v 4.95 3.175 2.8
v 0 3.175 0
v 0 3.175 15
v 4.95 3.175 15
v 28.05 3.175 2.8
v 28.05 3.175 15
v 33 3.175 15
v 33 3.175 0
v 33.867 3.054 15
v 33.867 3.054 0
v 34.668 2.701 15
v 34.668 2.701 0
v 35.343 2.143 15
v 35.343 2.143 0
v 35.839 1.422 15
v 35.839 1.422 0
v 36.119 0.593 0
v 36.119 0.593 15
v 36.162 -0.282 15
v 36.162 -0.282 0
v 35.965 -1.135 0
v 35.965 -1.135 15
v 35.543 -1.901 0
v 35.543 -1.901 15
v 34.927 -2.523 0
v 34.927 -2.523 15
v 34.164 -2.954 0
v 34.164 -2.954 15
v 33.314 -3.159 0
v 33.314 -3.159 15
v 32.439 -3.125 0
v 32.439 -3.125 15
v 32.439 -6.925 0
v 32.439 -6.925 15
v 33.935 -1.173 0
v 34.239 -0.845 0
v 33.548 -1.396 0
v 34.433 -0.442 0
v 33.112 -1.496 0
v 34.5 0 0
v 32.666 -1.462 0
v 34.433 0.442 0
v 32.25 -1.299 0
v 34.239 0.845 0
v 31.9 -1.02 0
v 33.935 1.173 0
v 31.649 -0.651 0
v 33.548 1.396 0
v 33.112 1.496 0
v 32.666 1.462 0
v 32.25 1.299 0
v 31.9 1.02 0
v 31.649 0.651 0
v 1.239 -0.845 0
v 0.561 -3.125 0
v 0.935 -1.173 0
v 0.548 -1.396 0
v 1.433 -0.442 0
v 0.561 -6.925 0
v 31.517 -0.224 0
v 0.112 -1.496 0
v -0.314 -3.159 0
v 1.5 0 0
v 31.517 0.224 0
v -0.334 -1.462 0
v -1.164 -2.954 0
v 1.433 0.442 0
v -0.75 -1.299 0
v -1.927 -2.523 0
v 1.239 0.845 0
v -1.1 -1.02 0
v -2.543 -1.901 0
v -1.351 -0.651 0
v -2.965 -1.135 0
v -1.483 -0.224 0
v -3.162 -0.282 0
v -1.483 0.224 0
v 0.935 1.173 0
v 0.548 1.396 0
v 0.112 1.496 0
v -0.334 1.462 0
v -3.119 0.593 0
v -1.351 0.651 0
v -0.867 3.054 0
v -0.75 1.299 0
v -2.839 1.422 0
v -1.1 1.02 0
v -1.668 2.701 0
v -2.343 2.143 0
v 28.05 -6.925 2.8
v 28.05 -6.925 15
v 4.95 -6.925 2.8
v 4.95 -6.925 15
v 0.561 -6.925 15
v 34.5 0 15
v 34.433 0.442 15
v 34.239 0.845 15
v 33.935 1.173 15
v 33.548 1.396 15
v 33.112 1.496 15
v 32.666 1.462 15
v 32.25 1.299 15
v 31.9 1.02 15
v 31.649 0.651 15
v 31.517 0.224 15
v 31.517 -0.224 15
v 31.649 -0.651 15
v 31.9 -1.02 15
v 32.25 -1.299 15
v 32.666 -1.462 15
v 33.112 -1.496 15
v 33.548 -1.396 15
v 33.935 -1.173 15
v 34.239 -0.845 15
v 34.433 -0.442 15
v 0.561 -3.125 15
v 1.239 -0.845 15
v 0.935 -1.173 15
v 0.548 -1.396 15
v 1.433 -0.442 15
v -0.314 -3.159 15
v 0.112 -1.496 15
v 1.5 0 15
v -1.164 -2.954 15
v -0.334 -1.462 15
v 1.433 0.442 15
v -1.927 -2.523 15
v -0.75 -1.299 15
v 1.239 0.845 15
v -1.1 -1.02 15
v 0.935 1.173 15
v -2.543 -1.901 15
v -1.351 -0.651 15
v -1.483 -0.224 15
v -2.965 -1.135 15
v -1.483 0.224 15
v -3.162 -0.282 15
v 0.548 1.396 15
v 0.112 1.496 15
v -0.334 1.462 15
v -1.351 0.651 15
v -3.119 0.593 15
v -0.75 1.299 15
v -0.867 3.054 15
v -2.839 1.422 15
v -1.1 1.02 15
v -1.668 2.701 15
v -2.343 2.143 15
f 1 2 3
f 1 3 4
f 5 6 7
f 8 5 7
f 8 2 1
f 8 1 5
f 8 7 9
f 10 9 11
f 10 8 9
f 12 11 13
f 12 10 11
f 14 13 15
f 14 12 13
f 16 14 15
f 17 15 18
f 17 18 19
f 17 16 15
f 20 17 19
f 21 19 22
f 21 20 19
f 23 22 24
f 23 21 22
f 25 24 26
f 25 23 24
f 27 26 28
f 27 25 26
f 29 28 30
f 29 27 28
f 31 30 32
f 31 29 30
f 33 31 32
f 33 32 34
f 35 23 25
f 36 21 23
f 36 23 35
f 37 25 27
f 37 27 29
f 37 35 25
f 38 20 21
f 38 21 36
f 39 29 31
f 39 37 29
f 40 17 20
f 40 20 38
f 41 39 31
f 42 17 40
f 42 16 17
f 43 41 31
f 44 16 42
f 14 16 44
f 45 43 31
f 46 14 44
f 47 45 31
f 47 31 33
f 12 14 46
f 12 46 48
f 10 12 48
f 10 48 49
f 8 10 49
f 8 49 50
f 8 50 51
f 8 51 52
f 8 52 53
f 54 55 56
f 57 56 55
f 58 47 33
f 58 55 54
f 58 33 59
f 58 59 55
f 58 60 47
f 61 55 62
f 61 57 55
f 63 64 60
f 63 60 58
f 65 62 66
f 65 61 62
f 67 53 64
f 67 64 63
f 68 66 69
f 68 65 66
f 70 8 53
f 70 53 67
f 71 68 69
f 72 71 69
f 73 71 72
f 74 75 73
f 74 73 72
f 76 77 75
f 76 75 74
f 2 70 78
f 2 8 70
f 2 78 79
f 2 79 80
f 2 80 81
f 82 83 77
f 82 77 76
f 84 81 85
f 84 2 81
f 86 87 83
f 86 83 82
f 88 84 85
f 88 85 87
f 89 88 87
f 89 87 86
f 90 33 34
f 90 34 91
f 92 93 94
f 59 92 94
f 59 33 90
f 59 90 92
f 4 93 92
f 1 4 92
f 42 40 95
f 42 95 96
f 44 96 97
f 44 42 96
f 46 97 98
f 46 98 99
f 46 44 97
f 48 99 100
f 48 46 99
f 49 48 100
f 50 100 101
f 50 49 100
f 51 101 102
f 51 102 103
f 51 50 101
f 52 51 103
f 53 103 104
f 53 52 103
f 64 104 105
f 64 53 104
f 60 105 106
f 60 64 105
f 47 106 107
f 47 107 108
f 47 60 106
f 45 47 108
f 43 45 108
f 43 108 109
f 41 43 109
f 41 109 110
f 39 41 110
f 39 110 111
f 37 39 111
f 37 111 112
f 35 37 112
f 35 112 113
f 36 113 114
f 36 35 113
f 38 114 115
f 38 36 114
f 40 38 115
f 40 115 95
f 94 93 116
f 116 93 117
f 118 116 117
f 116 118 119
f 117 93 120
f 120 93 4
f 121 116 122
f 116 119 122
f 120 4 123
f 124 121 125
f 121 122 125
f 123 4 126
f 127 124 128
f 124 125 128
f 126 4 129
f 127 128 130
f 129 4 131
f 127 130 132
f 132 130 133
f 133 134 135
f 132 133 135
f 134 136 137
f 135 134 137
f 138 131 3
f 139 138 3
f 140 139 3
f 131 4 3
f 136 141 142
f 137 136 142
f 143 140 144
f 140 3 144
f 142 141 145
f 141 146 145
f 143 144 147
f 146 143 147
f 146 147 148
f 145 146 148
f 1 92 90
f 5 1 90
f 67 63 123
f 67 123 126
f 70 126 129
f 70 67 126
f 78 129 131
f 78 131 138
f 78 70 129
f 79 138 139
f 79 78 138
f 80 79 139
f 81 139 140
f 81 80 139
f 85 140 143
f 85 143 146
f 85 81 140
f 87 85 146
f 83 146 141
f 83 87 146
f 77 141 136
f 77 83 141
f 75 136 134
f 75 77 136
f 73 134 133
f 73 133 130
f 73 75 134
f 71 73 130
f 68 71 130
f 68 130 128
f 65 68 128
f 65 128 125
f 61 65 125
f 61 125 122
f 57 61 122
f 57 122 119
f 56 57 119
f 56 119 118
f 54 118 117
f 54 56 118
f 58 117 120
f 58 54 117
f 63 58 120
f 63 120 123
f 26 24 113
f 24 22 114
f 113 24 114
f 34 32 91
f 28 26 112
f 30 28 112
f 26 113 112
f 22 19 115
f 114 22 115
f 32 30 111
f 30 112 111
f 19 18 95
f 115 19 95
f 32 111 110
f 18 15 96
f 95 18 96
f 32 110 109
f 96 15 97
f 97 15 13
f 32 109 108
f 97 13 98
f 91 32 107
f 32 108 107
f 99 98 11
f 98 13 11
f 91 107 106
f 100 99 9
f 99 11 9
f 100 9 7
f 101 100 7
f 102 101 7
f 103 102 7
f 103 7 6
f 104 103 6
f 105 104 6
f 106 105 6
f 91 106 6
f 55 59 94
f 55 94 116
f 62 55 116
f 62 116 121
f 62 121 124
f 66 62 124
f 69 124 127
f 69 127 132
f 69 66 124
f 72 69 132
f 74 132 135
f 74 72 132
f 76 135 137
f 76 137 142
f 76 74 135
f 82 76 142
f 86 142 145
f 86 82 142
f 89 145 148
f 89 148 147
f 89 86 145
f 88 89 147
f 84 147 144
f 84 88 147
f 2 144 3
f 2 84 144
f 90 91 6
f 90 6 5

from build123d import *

# Parameters (mm, degrees)
ESBO_O1_R                  = 1.5
RESSALTO_EXTRUS_O1_DEPTH   = 15
CORTE_EXTRUS_O1_DEPTH      = 40.769162048
CORTE_EXTRUS_O1_DEPTH_BACK = 40.769162048
ESBO_O2_W                  = 23.1
ESBO_O2_H                  = 12.2


with BuildPart() as part:
    # Esboço1 → Ressalto-extrusão1 (new body)
    with BuildSketch(Plane.XY):
        with BuildLine():
            Line((0, 3.175), (33, 3.175))
            ThreePointArc((33, 3.175), (36.162475296, -0.281735692), (32.438751392, -3.125))
            Line((32.438751392, -3.125), (32.438751392, -6.925))
            Line((32.438751392, -6.925), (0.561248608, -6.925))
            Line((0.561248608, -6.925), (0.561248608, -3.125))
            ThreePointArc((0.561248608, -3.125), (-3.162475296, -0.281735692), (0, 3.175))
        make_face()
        Circle(ESBO_O1_R, mode=Mode.SUBTRACT)
        with Locations((33, 0)):
            Circle(ESBO_O1_R, mode=Mode.SUBTRACT)
    extrude(amount=RESSALTO_EXTRUS_O1_DEPTH)

    # Esboço2 → Corte-extrusão1 (cut, two sides: drawn at the far end of the back side and taken through both)
    with BuildSketch(Plane(origin=(0, 0, 0), x_dir=(1, 0, 0), z_dir=(0, 1, 0)).offset(-CORTE_EXTRUS_O1_DEPTH_BACK)):
        with Locations((16.5, -8.9)):
            Rectangle(ESBO_O2_W, ESBO_O2_H)
    extrude(amount=CORTE_EXTRUS_O1_DEPTH + CORTE_EXTRUS_O1_DEPTH_BACK, mode=Mode.SUBTRACT)


solid = part.part
